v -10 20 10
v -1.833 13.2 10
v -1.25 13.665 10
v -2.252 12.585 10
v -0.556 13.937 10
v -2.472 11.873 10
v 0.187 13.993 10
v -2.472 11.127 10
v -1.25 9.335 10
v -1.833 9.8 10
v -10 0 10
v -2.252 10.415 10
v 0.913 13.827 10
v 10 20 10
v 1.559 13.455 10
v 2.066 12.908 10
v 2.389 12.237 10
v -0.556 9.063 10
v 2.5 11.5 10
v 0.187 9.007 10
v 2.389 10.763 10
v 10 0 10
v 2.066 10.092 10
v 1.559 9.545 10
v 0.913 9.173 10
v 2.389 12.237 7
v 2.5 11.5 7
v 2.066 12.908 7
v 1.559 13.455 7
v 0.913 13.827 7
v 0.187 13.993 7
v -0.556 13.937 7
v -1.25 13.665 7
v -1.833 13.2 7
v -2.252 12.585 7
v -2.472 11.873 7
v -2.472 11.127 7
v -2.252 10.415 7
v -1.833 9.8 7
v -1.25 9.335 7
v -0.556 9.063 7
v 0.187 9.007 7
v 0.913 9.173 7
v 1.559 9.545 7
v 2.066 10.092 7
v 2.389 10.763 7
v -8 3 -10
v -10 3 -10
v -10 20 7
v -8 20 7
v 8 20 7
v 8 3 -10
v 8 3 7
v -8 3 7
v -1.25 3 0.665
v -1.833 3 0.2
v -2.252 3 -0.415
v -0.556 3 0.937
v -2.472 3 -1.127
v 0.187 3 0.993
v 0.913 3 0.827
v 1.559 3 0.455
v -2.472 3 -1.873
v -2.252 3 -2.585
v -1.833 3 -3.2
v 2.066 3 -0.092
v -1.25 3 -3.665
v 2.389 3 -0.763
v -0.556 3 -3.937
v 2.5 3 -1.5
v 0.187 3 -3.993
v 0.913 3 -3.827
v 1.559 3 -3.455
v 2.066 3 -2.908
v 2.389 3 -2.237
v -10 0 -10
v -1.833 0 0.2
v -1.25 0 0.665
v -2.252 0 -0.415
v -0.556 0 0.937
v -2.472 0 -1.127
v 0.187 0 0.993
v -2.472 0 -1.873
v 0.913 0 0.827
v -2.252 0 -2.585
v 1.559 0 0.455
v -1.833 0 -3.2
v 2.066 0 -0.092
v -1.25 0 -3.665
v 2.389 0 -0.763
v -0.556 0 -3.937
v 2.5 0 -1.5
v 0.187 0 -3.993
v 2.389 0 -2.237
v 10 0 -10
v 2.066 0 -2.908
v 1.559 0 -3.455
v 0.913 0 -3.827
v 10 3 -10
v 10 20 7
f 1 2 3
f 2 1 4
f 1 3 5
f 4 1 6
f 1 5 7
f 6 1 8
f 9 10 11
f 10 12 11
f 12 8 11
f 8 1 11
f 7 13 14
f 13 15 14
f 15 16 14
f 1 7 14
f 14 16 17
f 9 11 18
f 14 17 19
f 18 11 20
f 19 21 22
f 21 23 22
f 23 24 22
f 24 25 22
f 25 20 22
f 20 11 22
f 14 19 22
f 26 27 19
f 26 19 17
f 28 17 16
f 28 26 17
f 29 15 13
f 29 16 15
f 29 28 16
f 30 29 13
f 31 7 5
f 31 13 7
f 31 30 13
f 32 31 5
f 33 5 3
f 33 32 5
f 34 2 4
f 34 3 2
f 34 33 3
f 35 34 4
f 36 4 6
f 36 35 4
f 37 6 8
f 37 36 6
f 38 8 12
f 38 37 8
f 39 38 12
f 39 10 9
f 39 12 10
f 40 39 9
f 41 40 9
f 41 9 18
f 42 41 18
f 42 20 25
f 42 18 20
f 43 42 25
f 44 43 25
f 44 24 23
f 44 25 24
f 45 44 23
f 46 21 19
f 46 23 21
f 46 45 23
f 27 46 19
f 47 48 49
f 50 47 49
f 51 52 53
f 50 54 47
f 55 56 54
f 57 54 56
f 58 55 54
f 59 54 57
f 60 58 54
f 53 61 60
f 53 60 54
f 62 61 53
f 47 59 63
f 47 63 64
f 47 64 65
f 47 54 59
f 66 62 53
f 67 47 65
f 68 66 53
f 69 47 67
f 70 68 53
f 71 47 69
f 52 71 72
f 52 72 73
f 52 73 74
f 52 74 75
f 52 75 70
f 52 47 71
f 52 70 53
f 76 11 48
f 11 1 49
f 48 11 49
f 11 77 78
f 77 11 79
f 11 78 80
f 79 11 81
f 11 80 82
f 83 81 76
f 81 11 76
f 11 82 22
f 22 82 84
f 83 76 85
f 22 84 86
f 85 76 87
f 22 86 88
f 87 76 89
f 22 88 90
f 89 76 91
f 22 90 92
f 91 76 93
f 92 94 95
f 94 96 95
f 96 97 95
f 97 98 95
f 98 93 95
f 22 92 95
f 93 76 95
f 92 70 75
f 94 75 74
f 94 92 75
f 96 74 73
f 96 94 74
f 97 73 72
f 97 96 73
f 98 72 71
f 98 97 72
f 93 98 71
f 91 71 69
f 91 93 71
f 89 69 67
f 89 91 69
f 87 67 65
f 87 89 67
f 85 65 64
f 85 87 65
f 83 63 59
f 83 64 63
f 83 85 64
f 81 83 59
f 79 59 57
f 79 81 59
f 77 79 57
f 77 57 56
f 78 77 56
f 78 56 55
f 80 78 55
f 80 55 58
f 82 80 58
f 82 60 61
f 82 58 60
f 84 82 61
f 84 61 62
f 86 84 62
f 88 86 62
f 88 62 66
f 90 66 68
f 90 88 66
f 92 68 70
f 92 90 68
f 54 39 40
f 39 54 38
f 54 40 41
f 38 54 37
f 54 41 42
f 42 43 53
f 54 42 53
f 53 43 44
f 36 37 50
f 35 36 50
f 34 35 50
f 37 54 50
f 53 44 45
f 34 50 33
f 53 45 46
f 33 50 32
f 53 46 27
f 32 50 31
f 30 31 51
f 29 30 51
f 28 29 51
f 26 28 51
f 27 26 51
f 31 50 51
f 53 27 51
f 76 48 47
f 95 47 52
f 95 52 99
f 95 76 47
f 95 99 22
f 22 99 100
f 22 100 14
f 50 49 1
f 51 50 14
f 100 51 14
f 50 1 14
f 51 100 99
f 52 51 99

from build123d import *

# Parameters (mm, degrees)
CROQUIS1_W                 = 20
CROQUIS1_H                 = 20
SALIENTE_EXTRUIR1_DEPTH    = 3
SALIENTE_EXTRUIR2_START    = 10
CROQUIS3_W                 = 20
CROQUIS3_H                 = 20
SALIENTE_EXTRUIR2_DEPTH    = 3
SALIENTE_EXTRUIR3_START    = 10
SALIENTE_EXTRUIR3_DEPTH    = 2
SALIENTE_EXTRUIR4_START    = -10
SALIENTE_EXTRUIR4_DEPTH    = 2
CROQUIS6_R                 = 2.5
CORTAR_EXTRUIR3_DEPTH      = 21
CORTAR_EXTRUIR3_DEPTH_BACK = 1
CROQUIS7_R                 = 2.5
CORTAR_EXTRUIR4_DEPTH      = 11
CORTAR_EXTRUIR4_DEPTH_BACK = 11


with BuildPart() as part:
    # Croquis1 → Saliente-Extruir1 (new body)
    with BuildSketch(Plane(origin=(0, 0, 0), x_dir=(1, 0, 0), z_dir=(0, 1, 0))):
        Rectangle(CROQUIS1_W, CROQUIS1_H)
    extrude(amount=SALIENTE_EXTRUIR1_DEPTH)

    # Croquis3 → Saliente-Extruir2 (add)
    with BuildSketch(Plane.XY.offset(SALIENTE_EXTRUIR2_START)):
        with Locations((0, 10)):
            Rectangle(CROQUIS3_W, CROQUIS3_H)
    extrude(amount=-SALIENTE_EXTRUIR2_DEPTH)

    # Croquis4 → Saliente-Extruir3 (add)
    with BuildSketch(Plane(origin=(0, 0, 0), x_dir=(0, 0, -1), z_dir=(1, 0, 0)).offset(SALIENTE_EXTRUIR3_START)):
        Polygon((-7, 20), (10, 3), (-7, 3), align=None)
    extrude(amount=-SALIENTE_EXTRUIR3_DEPTH)

    # Croquis8 → Saliente-Extruir4 (add)
    with BuildSketch(Plane(origin=(0, 0, 0), x_dir=(0, 0, -1), z_dir=(1, 0, 0)).offset(SALIENTE_EXTRUIR4_START)):
        Polygon((10, 3), (-7, 20), (-7, 3), align=None)
    extrude(amount=SALIENTE_EXTRUIR4_DEPTH)

    # Croquis6 → Cortar-Extruir3 (cut, two sides)
    with BuildSketch(Plane(origin=(0, 0, 0), x_dir=(1, 0, 0), z_dir=(0, 1, 0))) as cortar_extruir3_sk:
        with Locations((0, 1.5)):
            Circle(CROQUIS6_R)
    extrude(amount=CORTAR_EXTRUIR3_DEPTH, mode=Mode.SUBTRACT)
    extrude(cortar_extruir3_sk.sketch, amount=-CORTAR_EXTRUIR3_DEPTH_BACK, mode=Mode.SUBTRACT)

    # Croquis7 → Cortar-Extruir4 (cut, two sides)
    with BuildSketch(Plane.XY) as cortar_extruir4_sk:
        with Locations((0, 11.5)):
            Circle(CROQUIS7_R)
    extrude(amount=CORTAR_EXTRUIR4_DEPTH, mode=Mode.SUBTRACT)
    extrude(cortar_extruir4_sk.sketch, amount=-CORTAR_EXTRUIR4_DEPTH_BACK, mode=Mode.SUBTRACT)


solid = part.part
